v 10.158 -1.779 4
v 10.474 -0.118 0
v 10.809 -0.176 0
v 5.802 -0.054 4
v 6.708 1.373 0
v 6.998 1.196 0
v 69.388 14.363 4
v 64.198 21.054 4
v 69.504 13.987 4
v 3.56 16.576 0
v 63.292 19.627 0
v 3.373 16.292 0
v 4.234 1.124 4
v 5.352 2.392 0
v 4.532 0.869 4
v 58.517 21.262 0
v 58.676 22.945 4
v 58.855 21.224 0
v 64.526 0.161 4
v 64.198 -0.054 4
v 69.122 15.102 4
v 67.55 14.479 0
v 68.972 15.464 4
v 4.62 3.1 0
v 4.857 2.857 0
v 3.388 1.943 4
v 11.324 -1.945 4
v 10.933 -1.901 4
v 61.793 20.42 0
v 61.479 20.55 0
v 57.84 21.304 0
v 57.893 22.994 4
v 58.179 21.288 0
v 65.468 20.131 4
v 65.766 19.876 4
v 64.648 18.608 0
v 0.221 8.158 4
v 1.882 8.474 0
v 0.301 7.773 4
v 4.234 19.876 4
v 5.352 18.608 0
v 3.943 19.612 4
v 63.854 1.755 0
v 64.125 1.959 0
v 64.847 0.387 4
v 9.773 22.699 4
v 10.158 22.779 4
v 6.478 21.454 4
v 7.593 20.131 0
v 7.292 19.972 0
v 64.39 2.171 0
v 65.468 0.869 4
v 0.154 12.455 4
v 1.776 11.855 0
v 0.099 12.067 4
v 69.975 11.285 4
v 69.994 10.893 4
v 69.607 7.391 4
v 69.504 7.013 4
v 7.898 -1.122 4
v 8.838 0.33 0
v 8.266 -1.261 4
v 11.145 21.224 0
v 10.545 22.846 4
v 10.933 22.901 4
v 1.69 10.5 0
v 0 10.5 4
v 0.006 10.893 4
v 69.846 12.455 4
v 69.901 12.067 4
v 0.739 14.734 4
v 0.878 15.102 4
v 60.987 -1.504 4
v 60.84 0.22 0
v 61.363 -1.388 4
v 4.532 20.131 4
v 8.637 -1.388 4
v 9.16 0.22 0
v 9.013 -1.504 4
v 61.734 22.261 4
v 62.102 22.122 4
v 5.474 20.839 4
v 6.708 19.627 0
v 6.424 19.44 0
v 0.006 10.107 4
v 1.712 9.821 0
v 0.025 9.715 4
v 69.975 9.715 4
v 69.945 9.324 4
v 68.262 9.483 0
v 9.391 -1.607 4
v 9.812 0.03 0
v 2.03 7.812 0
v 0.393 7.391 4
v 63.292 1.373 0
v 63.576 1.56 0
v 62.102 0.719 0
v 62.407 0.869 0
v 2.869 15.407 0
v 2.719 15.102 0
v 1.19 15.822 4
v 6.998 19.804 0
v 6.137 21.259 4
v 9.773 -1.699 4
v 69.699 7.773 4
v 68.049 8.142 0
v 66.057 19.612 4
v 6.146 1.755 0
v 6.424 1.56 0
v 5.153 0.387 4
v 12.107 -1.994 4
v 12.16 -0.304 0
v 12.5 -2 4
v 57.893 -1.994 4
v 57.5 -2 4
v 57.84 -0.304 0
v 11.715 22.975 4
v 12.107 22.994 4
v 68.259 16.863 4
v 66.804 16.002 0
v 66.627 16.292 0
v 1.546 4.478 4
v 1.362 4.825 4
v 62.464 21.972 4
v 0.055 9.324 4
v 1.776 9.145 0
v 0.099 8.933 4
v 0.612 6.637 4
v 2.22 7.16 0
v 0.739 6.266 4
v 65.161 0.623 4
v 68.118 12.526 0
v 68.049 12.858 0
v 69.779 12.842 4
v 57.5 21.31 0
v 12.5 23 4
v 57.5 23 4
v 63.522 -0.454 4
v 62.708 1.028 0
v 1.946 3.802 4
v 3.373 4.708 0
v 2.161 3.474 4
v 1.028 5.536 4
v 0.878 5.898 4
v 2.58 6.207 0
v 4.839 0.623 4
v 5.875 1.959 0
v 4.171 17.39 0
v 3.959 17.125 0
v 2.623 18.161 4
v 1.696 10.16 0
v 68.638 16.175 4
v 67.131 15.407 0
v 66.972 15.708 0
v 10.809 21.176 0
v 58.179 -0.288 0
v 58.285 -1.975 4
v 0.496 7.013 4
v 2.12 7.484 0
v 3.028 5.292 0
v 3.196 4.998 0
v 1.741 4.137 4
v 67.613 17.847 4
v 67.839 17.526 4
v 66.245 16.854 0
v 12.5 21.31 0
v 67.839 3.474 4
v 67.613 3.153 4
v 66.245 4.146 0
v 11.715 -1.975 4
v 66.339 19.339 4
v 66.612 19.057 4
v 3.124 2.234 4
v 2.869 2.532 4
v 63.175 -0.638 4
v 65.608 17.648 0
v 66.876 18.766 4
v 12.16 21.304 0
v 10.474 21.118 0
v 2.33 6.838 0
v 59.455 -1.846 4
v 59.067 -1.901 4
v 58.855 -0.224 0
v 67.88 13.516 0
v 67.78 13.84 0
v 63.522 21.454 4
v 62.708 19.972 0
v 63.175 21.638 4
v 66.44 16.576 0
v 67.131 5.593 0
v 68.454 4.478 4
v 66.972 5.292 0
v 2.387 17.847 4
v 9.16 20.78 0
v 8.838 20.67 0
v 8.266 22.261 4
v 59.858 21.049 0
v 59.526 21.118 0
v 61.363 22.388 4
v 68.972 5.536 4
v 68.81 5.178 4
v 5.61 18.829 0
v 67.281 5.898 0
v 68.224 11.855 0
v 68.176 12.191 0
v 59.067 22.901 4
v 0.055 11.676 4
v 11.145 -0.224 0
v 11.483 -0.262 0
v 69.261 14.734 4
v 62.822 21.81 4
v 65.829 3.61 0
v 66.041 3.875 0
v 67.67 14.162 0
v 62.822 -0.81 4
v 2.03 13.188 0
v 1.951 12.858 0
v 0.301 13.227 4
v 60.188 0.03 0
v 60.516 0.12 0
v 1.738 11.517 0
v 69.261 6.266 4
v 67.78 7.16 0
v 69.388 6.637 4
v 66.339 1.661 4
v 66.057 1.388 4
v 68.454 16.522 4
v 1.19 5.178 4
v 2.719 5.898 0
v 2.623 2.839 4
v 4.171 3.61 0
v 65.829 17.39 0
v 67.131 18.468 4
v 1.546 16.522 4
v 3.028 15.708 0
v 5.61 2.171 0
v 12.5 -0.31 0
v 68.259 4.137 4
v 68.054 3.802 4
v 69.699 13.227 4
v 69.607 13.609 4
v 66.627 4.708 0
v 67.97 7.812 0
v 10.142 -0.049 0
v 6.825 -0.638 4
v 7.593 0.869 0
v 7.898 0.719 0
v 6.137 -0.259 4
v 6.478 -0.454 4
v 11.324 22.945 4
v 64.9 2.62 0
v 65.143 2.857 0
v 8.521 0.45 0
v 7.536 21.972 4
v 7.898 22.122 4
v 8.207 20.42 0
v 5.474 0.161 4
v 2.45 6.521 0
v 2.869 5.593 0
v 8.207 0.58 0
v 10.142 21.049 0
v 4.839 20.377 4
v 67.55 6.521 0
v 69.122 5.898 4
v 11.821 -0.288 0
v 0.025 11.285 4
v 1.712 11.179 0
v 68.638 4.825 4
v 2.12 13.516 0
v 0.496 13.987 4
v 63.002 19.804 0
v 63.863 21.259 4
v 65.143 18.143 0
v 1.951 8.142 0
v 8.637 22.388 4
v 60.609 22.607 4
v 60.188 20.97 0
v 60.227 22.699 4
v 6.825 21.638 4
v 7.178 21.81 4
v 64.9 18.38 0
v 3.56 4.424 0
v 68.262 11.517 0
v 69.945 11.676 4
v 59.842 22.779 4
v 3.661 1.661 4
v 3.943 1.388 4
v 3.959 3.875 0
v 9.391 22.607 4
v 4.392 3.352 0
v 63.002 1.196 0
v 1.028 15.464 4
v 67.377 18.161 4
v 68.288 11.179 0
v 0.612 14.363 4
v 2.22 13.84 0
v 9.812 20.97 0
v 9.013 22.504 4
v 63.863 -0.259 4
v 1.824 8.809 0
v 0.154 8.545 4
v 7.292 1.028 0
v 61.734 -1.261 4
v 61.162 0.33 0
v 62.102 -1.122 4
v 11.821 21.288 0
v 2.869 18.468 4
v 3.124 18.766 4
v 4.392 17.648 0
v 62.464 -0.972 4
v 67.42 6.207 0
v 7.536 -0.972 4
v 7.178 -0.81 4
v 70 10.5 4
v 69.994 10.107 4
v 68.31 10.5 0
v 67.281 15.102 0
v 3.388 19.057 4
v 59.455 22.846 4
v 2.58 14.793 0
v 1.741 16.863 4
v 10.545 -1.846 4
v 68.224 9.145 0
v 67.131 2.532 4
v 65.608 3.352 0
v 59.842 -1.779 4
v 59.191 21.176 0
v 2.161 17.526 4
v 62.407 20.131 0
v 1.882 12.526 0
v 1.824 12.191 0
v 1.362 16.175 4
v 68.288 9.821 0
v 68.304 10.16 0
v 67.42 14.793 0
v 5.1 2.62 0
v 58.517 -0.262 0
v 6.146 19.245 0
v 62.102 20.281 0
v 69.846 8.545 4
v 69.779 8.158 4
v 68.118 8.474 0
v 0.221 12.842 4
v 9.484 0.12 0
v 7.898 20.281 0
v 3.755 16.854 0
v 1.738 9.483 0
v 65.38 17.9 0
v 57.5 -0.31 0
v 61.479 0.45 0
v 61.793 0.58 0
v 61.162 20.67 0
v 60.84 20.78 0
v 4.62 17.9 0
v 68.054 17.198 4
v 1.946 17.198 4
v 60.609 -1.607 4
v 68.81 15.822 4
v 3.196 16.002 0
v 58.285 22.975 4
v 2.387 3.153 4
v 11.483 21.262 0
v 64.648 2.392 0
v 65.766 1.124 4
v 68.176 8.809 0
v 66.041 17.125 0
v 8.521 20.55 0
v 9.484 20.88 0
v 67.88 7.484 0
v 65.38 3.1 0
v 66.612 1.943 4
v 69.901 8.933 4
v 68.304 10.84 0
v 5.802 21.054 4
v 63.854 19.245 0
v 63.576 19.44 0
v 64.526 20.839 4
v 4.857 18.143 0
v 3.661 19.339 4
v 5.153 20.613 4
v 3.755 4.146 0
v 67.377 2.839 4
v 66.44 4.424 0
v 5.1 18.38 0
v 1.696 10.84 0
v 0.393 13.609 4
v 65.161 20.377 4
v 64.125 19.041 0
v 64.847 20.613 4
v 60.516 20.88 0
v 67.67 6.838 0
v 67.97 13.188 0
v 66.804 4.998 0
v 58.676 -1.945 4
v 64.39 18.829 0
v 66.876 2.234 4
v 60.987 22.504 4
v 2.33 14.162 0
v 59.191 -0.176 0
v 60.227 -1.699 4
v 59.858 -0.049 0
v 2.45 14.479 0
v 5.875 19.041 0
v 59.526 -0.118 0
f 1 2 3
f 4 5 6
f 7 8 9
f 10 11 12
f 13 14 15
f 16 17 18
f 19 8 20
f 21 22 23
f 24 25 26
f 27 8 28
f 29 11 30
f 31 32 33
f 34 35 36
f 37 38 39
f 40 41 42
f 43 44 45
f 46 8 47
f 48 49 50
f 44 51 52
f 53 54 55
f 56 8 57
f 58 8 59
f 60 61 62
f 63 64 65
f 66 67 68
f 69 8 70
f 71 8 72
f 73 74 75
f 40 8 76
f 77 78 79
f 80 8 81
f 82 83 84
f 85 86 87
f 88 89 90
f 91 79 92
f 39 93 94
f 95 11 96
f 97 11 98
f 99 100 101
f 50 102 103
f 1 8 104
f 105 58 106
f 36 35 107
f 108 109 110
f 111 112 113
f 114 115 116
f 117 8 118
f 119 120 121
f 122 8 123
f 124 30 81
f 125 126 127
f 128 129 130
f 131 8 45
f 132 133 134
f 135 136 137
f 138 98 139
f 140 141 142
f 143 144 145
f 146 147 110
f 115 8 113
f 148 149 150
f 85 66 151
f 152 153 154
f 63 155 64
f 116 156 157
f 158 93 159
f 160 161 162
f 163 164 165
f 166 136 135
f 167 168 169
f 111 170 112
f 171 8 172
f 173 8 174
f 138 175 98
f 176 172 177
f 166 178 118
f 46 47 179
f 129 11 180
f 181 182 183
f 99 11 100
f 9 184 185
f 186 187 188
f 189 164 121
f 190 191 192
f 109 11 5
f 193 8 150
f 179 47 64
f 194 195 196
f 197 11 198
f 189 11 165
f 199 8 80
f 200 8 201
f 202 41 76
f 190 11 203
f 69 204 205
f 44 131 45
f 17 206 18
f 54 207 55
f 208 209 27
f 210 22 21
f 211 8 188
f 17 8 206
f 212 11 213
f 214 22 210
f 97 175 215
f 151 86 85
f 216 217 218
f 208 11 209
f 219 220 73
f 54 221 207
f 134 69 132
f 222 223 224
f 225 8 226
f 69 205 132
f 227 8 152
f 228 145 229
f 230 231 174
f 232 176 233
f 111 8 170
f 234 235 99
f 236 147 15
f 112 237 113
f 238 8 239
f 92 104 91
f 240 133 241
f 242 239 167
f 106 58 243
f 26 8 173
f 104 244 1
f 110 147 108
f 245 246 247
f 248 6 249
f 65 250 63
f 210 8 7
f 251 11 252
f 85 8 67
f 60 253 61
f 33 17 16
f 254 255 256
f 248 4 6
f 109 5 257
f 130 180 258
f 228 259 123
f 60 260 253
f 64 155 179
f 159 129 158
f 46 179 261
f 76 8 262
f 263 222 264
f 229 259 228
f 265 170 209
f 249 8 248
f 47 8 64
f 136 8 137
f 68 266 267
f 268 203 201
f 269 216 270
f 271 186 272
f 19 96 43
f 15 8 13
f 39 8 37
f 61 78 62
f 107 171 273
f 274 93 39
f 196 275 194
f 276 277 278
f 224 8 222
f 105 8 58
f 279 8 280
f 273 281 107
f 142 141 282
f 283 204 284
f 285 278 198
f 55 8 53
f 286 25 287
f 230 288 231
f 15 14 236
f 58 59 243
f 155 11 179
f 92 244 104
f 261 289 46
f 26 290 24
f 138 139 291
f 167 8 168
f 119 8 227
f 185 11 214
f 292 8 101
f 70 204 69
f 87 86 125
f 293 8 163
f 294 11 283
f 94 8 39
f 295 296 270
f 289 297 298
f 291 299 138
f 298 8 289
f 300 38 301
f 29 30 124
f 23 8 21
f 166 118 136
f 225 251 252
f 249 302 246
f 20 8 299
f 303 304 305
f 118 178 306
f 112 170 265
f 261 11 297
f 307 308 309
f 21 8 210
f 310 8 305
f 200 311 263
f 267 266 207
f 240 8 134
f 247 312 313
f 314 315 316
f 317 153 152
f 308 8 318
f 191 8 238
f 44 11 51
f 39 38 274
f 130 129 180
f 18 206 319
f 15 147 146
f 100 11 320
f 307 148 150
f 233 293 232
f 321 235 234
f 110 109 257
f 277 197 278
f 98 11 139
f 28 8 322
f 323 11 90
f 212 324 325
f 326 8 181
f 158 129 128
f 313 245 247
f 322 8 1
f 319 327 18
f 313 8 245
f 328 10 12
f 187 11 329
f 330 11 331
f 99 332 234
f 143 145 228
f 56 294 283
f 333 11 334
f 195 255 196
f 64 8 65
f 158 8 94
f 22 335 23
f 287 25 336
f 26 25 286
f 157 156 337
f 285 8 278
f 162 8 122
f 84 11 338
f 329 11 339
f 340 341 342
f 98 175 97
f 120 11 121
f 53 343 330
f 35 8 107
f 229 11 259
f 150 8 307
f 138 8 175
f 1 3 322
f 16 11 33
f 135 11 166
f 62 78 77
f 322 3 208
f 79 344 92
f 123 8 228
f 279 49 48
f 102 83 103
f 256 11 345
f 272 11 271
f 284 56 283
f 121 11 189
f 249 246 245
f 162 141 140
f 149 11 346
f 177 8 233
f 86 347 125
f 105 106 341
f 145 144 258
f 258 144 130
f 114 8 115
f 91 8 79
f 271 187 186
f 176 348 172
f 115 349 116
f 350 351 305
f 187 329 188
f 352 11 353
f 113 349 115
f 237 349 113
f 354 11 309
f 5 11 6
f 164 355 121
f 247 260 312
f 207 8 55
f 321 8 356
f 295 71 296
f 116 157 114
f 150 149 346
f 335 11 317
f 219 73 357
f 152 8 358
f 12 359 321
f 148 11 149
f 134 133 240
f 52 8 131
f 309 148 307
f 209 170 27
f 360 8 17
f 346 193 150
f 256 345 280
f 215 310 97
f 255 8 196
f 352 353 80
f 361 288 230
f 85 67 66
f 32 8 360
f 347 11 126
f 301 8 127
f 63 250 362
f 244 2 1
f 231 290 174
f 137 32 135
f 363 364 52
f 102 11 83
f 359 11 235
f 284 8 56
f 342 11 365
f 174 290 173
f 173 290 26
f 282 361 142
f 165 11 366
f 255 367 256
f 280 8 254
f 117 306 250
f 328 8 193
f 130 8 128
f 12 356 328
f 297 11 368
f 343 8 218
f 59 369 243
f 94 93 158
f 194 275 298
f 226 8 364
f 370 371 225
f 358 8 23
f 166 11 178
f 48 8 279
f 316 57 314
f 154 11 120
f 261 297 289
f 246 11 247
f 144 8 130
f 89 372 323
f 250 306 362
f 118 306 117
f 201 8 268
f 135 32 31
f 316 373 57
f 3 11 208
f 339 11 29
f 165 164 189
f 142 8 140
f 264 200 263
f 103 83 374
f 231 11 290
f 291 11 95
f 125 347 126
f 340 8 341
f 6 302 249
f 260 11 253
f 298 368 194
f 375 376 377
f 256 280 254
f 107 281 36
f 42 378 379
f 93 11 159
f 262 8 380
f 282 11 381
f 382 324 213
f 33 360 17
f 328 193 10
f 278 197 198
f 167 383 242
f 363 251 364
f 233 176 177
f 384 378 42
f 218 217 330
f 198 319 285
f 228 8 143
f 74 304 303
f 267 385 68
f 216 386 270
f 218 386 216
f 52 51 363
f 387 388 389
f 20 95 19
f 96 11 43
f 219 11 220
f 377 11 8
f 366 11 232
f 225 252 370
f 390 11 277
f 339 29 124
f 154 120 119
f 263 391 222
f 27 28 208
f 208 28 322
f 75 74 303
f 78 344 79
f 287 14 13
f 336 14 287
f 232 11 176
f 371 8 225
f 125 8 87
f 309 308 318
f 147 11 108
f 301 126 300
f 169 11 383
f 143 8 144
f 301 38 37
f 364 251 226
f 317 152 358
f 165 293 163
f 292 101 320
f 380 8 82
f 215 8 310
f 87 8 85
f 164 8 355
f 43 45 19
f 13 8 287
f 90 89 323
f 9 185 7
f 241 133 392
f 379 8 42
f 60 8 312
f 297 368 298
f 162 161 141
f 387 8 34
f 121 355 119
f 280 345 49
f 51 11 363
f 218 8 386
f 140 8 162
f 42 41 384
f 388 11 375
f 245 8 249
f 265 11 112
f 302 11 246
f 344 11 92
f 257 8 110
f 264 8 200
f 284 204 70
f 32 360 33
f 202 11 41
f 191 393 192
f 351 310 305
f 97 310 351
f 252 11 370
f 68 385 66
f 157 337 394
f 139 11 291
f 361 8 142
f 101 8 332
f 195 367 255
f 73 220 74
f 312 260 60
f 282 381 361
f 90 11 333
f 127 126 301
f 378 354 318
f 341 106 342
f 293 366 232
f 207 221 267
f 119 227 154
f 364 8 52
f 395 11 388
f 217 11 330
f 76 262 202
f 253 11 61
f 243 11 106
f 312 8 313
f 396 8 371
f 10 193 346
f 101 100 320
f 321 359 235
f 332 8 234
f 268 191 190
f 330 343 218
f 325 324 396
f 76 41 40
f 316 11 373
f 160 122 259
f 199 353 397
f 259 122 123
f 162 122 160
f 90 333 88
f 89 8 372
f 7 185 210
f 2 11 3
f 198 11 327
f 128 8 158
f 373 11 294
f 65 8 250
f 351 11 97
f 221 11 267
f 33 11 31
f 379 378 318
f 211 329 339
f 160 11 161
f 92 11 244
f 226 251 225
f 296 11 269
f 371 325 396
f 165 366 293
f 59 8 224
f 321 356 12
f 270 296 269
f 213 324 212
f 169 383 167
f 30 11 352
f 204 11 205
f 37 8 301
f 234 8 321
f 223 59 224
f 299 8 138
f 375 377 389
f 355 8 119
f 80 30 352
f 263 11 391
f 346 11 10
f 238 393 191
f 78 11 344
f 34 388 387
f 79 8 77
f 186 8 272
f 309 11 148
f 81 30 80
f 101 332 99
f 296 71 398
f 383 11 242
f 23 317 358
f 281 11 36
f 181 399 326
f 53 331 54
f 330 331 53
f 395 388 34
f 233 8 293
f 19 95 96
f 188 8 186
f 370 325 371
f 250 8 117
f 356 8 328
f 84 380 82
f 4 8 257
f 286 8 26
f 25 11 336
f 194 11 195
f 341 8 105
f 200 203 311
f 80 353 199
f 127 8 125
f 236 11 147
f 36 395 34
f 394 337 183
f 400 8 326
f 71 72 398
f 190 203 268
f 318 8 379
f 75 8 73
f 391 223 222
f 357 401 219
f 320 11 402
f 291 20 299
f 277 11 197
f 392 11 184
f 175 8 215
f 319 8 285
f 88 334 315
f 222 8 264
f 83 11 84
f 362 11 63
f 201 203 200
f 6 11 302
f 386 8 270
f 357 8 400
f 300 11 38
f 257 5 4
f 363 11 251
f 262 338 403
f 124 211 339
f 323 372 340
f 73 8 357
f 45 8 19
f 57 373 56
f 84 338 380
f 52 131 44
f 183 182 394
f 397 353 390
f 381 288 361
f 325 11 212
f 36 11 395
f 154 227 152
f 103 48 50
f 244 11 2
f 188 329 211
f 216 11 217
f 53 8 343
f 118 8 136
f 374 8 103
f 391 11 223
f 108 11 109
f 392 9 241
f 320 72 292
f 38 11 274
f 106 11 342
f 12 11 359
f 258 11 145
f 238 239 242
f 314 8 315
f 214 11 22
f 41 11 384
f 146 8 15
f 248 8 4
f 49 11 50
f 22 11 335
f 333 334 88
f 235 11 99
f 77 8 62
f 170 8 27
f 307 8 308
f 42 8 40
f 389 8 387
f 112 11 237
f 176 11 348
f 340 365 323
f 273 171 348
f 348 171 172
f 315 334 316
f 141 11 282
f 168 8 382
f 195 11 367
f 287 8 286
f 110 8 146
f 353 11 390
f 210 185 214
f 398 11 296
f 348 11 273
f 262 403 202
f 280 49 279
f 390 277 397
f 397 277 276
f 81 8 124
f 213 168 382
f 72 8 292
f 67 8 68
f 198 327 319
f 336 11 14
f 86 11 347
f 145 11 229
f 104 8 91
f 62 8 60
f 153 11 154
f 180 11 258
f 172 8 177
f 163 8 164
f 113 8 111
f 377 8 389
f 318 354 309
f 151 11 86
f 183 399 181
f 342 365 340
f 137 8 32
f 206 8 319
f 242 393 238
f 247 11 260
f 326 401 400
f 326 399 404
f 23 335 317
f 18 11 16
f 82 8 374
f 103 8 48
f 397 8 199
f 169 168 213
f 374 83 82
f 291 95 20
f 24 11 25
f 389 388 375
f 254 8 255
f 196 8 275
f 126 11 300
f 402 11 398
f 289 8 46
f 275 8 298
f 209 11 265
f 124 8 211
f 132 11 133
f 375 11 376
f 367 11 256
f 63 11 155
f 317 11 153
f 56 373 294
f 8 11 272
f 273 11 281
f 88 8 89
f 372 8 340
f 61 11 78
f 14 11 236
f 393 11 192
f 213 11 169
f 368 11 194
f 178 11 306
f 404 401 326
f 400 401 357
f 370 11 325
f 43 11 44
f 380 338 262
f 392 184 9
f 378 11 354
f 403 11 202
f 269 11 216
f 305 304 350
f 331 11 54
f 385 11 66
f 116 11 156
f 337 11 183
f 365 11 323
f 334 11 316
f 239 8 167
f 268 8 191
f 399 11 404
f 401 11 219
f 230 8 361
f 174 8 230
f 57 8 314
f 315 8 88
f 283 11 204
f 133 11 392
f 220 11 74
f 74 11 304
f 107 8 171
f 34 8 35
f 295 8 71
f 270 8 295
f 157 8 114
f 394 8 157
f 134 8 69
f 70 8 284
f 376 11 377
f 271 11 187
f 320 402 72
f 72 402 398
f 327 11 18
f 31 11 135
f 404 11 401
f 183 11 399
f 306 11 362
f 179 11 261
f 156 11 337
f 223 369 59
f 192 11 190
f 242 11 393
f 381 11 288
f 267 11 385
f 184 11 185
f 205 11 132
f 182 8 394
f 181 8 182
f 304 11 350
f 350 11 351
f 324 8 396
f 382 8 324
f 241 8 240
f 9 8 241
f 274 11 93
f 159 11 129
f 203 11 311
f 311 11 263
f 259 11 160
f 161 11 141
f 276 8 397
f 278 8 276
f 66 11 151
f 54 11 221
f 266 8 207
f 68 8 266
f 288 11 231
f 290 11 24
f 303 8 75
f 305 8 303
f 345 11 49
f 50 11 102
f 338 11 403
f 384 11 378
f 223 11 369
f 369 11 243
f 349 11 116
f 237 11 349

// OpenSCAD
// Customizable Miniature Base
// Created by Rob Ross, February 2014
//
// Derived from the "Customizable Stone Wall"
// Created by Ari M. Diacou, January 2014
// Shared under Creative Commons License: Attribution-ShareAlike 3.0 Unported (CC BY-SA 3.0) 
// see http://creativecommons.org/licenses/by-sa/3.0/
//
// Notes:
// - "have_topper" option is not working.
// - good: 40mm, num_x = 4, stone_offset = 2, master_seed=41, z_compression=1.1

// preview[view:south east, tilt:bottom]

/* [Base] */
// Width of base at the bottom (mm)
base_width = 25; // [25:60]
// Total height of base (mm)
base_height = 4; // [2:5]
// Angle of sidewall (0 degrees is vertical)
base_angle = 25;


// Whether or not to include the stone topper [0:1]
have_topper = 0; // [0:No,1:Yes]

/* [Stones] */
// Relative length of a stone
U=3;
// Relative width of a stone
W=2;
// Approx. number of stones along floor at widest point
num_x=4;
// Height of stones above base body
topper_height = 0.75;
// A way to save the arrangement of stones

/* [Tweaks] */
master_seed=41;
// Higher angles make more wedge-shaped stones, lower angles produce blocks. Reccomend 5-30 (zero crashes).
maximum_rotation_angle=5;
// Higher rotation angles might need more compression
z_compression=1.1;
// Offset shifts the stones in the Y direction, can help in placement
stone_offset=2;
// Width of lip between top of base and start of stones (mm)
lip_width = 0.3;
// In mm, reduces dimensions of base bottom to help it fit inside base exterior.
slop = 0.2;

/* [Hidden] */

// This is Ari's old "thickness" parameter, which doesn't need to be configurable.
V=1;
//The wall height in number of stones can be derived from other parameters
num_z= ceil(num_x / W * U);

// Split determines whether to bother to split the base into parts or not
split = 0;


/**** Main Routines ****/

if (split) {
	translate([-1 * base_width / 2, base_width / 2 - 2, 0]) base_bottom();
}

translate([0,base_width - 2, base_height + have_topper * topper_height]) rotate ([180,0,0]) 
{
if (have_topper) {
	union() {
		base_exterior();
		topper();
	}
}
else {
   hull() {
	base_exterior();
	translate([70-25,0,0]) base_exterior();
   }
}
}

// base_exterior() - angled sides and top of base
module base_exterior()
{
	translate([base_width / 2, base_width / 2, 0])
	difference() {
		cylinder($fn=200, r1 = base_width / 2, 
			r2 = base_width / 2 -  base_height *sin(base_angle),
			h = base_height - have_topper * topper_height);
		if (split) {
			cylinder(r=base_width/2 - base_height * sin(base_angle) - 1,
				h = base_height - 1);	
		}
	}
}

// base_bottom() - flat bottom of base with space for magnets, etc.
module base_bottom()
{
	difference() {
		cylinder(r=base_width/2 - base_height * sin(base_angle) - 1 - slop/2,
			h = base_height - 1 - slop);
		translate([0,0,1]) cylinder(r=base_width/2 - base_height * sin(base_angle) - 2 - slop/2,
			h = base_height - 1 - slop);
	}
}

// topper() -- generates the flagstone topper using the raw_flagstones() module below.
module topper()
{
//	intersection() {
		translate([0,stone_offset,2]) rotate([-90,0,0]) raw_flagstones(base_width + 5);
//		translate([base_width / 2, base_width / 2, base_height - have_topper * topper_height]) 
%			cylinder(r=base_width/2 - base_height * sin(base_angle) - lip_width,
				h = topper_height);
//	}
}

// raw_flagstones() -- generates the floor of flagstones; used to be wall() in Ari's
//                     original version of this code.
module raw_flagstones(width) {
	dimensions=[U,V,W];
	half_dimensions=[U/2,V,W];

	scalefactor = width / (W * num_z);
	scale([scalefactor, scalefactor, scalefactor]) 
	union(){
			for(z=[0:num_z-1]){
				for(x=[0:num_x-1 + 1]){
						translate([U*(x+0.5-0.25*(1+pow(-1,z))), 0,z*W*z_compression]) 
							color("SlateGray")
								rock(dimensions,maximum_rotation_angle,num_x*z+x);
					}
				}
		}
}

// rock() -- generates a rock at origin. Slight adjustment (bug fix?) from Ari's version.
module rock(unit_dimension, max_rotation, seed)
{
	rotation_vector=rands(-max_rotation,max_rotation,3*3,seed*1000*master_seed);
	//echo( "rotation_vector: ",rotation_vector);
	intersection()
	{
		rotate([rotation_vector[1],rotation_vector[1+1],rotation_vector[1+2]]) 
			cube(unit_dimension,center=true);
		rotate([rotation_vector[4],rotation_vector[4+1],rotation_vector[4+2]]) 
			cube(unit_dimension,center=true);
		rotate([rotation_vector[7],rotation_vector[7+1],rotation_vector[7+2]]) 
			cube(unit_dimension,center=true);
	}
}
